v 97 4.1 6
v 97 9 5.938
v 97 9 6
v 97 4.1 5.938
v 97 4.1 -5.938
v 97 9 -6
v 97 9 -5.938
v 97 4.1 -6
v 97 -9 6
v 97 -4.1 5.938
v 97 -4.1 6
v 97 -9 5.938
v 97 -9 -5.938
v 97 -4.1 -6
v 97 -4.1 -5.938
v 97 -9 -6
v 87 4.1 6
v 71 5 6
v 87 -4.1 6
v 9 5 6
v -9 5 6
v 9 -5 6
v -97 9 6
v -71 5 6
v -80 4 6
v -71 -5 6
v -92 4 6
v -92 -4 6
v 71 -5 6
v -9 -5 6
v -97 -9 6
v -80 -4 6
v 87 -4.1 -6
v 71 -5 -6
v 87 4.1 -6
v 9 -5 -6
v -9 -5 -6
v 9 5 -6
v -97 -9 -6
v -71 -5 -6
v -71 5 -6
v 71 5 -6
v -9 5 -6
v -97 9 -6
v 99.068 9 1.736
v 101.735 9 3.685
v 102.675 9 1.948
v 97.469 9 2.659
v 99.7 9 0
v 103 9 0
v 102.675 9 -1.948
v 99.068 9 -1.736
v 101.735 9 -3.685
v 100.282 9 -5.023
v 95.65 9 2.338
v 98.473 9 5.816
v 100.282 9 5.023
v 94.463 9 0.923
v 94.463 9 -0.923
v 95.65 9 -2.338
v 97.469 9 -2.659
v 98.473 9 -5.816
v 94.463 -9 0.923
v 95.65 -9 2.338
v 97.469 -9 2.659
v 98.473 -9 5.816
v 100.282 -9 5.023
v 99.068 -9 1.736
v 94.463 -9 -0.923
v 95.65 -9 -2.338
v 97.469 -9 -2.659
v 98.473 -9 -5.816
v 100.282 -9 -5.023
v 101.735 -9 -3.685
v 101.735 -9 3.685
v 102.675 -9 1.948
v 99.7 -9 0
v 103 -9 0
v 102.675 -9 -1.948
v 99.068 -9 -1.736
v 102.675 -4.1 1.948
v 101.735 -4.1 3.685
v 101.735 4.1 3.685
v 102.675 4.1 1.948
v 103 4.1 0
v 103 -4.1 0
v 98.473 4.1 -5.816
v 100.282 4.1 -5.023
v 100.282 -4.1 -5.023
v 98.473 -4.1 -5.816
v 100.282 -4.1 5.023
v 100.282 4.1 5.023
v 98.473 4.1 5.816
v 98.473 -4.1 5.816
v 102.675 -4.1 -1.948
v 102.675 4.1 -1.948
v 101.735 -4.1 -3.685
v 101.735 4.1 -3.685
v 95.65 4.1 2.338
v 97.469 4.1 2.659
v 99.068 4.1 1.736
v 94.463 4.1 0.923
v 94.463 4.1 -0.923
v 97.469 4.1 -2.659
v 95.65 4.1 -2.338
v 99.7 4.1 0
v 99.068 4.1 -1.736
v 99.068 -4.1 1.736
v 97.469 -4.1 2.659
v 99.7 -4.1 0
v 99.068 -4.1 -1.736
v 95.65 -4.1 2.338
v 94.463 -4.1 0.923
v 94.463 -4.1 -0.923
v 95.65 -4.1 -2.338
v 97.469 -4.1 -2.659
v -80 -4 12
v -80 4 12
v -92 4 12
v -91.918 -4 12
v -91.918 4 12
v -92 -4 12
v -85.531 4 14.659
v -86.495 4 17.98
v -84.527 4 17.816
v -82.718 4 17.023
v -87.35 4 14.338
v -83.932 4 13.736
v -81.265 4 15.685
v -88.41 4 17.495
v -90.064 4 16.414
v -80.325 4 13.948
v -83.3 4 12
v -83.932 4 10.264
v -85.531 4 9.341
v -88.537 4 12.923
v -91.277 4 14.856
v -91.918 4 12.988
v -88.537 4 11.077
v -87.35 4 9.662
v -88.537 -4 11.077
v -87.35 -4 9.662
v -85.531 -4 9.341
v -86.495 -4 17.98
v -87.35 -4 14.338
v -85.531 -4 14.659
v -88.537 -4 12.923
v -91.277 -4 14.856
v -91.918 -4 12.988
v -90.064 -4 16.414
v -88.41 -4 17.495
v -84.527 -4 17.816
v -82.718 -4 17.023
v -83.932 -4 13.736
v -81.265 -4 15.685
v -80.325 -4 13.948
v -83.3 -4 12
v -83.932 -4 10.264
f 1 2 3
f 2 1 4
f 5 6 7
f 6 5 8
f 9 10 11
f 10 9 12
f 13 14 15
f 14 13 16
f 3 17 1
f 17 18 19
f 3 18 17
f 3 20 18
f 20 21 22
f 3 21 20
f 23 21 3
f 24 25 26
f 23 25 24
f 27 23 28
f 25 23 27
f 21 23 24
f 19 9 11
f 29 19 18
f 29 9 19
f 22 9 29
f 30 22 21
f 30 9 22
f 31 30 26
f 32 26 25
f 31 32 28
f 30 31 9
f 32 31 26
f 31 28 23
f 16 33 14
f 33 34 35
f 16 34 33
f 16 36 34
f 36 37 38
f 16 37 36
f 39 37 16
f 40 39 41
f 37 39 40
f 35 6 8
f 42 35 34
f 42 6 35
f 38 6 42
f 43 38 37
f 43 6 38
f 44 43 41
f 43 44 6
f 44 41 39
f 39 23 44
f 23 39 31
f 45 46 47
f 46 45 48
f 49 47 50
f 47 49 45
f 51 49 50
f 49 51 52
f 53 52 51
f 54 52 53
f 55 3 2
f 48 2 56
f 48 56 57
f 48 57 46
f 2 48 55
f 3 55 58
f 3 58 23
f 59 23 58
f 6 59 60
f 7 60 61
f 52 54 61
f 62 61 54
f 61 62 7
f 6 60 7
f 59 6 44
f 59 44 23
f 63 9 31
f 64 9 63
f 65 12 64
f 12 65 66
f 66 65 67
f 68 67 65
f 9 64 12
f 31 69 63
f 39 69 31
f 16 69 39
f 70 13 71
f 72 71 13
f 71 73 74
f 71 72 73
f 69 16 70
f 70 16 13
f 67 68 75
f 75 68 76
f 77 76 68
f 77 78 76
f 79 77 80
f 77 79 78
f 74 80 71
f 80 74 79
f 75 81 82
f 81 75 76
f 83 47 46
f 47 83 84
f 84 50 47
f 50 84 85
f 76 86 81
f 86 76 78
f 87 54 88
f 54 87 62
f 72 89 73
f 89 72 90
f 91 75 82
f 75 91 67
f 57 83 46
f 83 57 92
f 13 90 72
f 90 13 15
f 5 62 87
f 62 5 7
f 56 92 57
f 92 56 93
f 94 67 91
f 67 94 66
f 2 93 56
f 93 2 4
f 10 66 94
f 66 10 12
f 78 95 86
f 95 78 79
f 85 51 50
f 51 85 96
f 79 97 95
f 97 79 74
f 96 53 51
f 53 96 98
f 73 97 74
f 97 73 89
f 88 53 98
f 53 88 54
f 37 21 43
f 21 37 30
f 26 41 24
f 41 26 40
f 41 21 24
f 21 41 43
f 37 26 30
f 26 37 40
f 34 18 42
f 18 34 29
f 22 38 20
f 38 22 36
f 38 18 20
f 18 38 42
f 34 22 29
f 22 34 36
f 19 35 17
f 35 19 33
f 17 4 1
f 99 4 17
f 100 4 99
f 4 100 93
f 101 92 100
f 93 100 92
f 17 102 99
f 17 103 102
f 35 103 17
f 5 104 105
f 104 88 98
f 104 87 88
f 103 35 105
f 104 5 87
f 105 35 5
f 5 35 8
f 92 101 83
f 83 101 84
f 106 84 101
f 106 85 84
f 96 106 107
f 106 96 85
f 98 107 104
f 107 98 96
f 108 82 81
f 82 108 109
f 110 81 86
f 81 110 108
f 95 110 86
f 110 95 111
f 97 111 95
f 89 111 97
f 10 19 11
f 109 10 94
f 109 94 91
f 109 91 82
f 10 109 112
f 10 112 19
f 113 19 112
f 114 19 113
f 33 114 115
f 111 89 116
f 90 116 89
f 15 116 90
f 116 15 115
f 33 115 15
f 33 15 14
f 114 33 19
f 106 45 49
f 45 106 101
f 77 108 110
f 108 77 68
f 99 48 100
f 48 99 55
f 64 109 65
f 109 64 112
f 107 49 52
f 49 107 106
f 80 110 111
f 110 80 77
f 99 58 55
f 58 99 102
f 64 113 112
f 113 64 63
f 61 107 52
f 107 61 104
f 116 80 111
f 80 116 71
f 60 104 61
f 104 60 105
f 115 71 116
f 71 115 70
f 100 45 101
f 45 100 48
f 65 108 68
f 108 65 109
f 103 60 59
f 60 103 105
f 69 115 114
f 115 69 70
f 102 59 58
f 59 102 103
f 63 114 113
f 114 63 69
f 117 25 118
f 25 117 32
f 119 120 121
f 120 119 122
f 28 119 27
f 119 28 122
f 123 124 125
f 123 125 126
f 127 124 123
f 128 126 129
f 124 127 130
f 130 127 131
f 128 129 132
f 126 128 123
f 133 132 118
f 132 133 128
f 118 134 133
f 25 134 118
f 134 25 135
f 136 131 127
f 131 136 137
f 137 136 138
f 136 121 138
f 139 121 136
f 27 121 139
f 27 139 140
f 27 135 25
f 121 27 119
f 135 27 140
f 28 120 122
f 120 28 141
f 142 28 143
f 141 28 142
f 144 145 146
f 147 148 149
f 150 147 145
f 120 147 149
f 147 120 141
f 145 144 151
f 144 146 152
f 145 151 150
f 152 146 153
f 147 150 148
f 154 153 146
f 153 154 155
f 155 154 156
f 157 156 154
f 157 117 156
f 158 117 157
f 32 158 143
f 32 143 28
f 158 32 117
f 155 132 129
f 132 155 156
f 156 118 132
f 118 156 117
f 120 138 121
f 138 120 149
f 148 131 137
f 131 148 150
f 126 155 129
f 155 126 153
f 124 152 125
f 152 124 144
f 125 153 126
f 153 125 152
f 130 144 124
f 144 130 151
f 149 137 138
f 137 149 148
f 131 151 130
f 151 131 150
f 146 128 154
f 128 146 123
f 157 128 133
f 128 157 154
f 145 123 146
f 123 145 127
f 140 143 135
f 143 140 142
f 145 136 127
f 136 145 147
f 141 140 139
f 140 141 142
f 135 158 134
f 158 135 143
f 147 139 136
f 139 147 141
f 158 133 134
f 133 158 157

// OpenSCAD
if (1) {
difference() {
union() {
cube(size=[194,18,12], center=true);
    translate([97,0,0])
rotate(90,[1,0,0])
cylinder(h=18,d=12,center=true);
}
union() {
    translate([-40,0,0])
cube(size=[62,10,13], center=true);
    translate([40,0,0])
cube(size=[62,10,13], center=true);
    translate([97,0,0])
    cube(size=[20,8.2,13],center=true);
    translate([97,0,0])
    rotate(90,[1,0,0])
    cylinder(h=19,d=5.4,center=true);
}
}
translate([-86,0,0])
difference() {
union() {
translate([0,0,8])
cube(size=[12,8,8],center=true);
translate([0,0,12])
rotate(90,[1,0,0])
cylinder(h=8,d=12,center=true);
}
translate([0,0,12])
rotate(90,[1,0,0])
cylinder(h=10,d=5.4,center=true);
}
}

if (0) {
rotate(90,[1,0,0]) {
translate([0,-25,0]) {
cube(size=[33.5,9,4]);
translate([0,0,-16]) {
cube(size=[4,9,16]);
cube(size=[6,9,3]);
}
}
translate([31,-25,0.9]) {
difference() {
rotate(40,[0,1,0])
cube(size=[23,9,4]);
translate([18.5,-1,-28.3])
cube(size=[4,11,20]);
}
translate([14.5,0,-28.3]) {
cube(size=[4,9,18]);
translate([-2,0,0])
cube(size=[5,9,3]);
}
}
}
}
